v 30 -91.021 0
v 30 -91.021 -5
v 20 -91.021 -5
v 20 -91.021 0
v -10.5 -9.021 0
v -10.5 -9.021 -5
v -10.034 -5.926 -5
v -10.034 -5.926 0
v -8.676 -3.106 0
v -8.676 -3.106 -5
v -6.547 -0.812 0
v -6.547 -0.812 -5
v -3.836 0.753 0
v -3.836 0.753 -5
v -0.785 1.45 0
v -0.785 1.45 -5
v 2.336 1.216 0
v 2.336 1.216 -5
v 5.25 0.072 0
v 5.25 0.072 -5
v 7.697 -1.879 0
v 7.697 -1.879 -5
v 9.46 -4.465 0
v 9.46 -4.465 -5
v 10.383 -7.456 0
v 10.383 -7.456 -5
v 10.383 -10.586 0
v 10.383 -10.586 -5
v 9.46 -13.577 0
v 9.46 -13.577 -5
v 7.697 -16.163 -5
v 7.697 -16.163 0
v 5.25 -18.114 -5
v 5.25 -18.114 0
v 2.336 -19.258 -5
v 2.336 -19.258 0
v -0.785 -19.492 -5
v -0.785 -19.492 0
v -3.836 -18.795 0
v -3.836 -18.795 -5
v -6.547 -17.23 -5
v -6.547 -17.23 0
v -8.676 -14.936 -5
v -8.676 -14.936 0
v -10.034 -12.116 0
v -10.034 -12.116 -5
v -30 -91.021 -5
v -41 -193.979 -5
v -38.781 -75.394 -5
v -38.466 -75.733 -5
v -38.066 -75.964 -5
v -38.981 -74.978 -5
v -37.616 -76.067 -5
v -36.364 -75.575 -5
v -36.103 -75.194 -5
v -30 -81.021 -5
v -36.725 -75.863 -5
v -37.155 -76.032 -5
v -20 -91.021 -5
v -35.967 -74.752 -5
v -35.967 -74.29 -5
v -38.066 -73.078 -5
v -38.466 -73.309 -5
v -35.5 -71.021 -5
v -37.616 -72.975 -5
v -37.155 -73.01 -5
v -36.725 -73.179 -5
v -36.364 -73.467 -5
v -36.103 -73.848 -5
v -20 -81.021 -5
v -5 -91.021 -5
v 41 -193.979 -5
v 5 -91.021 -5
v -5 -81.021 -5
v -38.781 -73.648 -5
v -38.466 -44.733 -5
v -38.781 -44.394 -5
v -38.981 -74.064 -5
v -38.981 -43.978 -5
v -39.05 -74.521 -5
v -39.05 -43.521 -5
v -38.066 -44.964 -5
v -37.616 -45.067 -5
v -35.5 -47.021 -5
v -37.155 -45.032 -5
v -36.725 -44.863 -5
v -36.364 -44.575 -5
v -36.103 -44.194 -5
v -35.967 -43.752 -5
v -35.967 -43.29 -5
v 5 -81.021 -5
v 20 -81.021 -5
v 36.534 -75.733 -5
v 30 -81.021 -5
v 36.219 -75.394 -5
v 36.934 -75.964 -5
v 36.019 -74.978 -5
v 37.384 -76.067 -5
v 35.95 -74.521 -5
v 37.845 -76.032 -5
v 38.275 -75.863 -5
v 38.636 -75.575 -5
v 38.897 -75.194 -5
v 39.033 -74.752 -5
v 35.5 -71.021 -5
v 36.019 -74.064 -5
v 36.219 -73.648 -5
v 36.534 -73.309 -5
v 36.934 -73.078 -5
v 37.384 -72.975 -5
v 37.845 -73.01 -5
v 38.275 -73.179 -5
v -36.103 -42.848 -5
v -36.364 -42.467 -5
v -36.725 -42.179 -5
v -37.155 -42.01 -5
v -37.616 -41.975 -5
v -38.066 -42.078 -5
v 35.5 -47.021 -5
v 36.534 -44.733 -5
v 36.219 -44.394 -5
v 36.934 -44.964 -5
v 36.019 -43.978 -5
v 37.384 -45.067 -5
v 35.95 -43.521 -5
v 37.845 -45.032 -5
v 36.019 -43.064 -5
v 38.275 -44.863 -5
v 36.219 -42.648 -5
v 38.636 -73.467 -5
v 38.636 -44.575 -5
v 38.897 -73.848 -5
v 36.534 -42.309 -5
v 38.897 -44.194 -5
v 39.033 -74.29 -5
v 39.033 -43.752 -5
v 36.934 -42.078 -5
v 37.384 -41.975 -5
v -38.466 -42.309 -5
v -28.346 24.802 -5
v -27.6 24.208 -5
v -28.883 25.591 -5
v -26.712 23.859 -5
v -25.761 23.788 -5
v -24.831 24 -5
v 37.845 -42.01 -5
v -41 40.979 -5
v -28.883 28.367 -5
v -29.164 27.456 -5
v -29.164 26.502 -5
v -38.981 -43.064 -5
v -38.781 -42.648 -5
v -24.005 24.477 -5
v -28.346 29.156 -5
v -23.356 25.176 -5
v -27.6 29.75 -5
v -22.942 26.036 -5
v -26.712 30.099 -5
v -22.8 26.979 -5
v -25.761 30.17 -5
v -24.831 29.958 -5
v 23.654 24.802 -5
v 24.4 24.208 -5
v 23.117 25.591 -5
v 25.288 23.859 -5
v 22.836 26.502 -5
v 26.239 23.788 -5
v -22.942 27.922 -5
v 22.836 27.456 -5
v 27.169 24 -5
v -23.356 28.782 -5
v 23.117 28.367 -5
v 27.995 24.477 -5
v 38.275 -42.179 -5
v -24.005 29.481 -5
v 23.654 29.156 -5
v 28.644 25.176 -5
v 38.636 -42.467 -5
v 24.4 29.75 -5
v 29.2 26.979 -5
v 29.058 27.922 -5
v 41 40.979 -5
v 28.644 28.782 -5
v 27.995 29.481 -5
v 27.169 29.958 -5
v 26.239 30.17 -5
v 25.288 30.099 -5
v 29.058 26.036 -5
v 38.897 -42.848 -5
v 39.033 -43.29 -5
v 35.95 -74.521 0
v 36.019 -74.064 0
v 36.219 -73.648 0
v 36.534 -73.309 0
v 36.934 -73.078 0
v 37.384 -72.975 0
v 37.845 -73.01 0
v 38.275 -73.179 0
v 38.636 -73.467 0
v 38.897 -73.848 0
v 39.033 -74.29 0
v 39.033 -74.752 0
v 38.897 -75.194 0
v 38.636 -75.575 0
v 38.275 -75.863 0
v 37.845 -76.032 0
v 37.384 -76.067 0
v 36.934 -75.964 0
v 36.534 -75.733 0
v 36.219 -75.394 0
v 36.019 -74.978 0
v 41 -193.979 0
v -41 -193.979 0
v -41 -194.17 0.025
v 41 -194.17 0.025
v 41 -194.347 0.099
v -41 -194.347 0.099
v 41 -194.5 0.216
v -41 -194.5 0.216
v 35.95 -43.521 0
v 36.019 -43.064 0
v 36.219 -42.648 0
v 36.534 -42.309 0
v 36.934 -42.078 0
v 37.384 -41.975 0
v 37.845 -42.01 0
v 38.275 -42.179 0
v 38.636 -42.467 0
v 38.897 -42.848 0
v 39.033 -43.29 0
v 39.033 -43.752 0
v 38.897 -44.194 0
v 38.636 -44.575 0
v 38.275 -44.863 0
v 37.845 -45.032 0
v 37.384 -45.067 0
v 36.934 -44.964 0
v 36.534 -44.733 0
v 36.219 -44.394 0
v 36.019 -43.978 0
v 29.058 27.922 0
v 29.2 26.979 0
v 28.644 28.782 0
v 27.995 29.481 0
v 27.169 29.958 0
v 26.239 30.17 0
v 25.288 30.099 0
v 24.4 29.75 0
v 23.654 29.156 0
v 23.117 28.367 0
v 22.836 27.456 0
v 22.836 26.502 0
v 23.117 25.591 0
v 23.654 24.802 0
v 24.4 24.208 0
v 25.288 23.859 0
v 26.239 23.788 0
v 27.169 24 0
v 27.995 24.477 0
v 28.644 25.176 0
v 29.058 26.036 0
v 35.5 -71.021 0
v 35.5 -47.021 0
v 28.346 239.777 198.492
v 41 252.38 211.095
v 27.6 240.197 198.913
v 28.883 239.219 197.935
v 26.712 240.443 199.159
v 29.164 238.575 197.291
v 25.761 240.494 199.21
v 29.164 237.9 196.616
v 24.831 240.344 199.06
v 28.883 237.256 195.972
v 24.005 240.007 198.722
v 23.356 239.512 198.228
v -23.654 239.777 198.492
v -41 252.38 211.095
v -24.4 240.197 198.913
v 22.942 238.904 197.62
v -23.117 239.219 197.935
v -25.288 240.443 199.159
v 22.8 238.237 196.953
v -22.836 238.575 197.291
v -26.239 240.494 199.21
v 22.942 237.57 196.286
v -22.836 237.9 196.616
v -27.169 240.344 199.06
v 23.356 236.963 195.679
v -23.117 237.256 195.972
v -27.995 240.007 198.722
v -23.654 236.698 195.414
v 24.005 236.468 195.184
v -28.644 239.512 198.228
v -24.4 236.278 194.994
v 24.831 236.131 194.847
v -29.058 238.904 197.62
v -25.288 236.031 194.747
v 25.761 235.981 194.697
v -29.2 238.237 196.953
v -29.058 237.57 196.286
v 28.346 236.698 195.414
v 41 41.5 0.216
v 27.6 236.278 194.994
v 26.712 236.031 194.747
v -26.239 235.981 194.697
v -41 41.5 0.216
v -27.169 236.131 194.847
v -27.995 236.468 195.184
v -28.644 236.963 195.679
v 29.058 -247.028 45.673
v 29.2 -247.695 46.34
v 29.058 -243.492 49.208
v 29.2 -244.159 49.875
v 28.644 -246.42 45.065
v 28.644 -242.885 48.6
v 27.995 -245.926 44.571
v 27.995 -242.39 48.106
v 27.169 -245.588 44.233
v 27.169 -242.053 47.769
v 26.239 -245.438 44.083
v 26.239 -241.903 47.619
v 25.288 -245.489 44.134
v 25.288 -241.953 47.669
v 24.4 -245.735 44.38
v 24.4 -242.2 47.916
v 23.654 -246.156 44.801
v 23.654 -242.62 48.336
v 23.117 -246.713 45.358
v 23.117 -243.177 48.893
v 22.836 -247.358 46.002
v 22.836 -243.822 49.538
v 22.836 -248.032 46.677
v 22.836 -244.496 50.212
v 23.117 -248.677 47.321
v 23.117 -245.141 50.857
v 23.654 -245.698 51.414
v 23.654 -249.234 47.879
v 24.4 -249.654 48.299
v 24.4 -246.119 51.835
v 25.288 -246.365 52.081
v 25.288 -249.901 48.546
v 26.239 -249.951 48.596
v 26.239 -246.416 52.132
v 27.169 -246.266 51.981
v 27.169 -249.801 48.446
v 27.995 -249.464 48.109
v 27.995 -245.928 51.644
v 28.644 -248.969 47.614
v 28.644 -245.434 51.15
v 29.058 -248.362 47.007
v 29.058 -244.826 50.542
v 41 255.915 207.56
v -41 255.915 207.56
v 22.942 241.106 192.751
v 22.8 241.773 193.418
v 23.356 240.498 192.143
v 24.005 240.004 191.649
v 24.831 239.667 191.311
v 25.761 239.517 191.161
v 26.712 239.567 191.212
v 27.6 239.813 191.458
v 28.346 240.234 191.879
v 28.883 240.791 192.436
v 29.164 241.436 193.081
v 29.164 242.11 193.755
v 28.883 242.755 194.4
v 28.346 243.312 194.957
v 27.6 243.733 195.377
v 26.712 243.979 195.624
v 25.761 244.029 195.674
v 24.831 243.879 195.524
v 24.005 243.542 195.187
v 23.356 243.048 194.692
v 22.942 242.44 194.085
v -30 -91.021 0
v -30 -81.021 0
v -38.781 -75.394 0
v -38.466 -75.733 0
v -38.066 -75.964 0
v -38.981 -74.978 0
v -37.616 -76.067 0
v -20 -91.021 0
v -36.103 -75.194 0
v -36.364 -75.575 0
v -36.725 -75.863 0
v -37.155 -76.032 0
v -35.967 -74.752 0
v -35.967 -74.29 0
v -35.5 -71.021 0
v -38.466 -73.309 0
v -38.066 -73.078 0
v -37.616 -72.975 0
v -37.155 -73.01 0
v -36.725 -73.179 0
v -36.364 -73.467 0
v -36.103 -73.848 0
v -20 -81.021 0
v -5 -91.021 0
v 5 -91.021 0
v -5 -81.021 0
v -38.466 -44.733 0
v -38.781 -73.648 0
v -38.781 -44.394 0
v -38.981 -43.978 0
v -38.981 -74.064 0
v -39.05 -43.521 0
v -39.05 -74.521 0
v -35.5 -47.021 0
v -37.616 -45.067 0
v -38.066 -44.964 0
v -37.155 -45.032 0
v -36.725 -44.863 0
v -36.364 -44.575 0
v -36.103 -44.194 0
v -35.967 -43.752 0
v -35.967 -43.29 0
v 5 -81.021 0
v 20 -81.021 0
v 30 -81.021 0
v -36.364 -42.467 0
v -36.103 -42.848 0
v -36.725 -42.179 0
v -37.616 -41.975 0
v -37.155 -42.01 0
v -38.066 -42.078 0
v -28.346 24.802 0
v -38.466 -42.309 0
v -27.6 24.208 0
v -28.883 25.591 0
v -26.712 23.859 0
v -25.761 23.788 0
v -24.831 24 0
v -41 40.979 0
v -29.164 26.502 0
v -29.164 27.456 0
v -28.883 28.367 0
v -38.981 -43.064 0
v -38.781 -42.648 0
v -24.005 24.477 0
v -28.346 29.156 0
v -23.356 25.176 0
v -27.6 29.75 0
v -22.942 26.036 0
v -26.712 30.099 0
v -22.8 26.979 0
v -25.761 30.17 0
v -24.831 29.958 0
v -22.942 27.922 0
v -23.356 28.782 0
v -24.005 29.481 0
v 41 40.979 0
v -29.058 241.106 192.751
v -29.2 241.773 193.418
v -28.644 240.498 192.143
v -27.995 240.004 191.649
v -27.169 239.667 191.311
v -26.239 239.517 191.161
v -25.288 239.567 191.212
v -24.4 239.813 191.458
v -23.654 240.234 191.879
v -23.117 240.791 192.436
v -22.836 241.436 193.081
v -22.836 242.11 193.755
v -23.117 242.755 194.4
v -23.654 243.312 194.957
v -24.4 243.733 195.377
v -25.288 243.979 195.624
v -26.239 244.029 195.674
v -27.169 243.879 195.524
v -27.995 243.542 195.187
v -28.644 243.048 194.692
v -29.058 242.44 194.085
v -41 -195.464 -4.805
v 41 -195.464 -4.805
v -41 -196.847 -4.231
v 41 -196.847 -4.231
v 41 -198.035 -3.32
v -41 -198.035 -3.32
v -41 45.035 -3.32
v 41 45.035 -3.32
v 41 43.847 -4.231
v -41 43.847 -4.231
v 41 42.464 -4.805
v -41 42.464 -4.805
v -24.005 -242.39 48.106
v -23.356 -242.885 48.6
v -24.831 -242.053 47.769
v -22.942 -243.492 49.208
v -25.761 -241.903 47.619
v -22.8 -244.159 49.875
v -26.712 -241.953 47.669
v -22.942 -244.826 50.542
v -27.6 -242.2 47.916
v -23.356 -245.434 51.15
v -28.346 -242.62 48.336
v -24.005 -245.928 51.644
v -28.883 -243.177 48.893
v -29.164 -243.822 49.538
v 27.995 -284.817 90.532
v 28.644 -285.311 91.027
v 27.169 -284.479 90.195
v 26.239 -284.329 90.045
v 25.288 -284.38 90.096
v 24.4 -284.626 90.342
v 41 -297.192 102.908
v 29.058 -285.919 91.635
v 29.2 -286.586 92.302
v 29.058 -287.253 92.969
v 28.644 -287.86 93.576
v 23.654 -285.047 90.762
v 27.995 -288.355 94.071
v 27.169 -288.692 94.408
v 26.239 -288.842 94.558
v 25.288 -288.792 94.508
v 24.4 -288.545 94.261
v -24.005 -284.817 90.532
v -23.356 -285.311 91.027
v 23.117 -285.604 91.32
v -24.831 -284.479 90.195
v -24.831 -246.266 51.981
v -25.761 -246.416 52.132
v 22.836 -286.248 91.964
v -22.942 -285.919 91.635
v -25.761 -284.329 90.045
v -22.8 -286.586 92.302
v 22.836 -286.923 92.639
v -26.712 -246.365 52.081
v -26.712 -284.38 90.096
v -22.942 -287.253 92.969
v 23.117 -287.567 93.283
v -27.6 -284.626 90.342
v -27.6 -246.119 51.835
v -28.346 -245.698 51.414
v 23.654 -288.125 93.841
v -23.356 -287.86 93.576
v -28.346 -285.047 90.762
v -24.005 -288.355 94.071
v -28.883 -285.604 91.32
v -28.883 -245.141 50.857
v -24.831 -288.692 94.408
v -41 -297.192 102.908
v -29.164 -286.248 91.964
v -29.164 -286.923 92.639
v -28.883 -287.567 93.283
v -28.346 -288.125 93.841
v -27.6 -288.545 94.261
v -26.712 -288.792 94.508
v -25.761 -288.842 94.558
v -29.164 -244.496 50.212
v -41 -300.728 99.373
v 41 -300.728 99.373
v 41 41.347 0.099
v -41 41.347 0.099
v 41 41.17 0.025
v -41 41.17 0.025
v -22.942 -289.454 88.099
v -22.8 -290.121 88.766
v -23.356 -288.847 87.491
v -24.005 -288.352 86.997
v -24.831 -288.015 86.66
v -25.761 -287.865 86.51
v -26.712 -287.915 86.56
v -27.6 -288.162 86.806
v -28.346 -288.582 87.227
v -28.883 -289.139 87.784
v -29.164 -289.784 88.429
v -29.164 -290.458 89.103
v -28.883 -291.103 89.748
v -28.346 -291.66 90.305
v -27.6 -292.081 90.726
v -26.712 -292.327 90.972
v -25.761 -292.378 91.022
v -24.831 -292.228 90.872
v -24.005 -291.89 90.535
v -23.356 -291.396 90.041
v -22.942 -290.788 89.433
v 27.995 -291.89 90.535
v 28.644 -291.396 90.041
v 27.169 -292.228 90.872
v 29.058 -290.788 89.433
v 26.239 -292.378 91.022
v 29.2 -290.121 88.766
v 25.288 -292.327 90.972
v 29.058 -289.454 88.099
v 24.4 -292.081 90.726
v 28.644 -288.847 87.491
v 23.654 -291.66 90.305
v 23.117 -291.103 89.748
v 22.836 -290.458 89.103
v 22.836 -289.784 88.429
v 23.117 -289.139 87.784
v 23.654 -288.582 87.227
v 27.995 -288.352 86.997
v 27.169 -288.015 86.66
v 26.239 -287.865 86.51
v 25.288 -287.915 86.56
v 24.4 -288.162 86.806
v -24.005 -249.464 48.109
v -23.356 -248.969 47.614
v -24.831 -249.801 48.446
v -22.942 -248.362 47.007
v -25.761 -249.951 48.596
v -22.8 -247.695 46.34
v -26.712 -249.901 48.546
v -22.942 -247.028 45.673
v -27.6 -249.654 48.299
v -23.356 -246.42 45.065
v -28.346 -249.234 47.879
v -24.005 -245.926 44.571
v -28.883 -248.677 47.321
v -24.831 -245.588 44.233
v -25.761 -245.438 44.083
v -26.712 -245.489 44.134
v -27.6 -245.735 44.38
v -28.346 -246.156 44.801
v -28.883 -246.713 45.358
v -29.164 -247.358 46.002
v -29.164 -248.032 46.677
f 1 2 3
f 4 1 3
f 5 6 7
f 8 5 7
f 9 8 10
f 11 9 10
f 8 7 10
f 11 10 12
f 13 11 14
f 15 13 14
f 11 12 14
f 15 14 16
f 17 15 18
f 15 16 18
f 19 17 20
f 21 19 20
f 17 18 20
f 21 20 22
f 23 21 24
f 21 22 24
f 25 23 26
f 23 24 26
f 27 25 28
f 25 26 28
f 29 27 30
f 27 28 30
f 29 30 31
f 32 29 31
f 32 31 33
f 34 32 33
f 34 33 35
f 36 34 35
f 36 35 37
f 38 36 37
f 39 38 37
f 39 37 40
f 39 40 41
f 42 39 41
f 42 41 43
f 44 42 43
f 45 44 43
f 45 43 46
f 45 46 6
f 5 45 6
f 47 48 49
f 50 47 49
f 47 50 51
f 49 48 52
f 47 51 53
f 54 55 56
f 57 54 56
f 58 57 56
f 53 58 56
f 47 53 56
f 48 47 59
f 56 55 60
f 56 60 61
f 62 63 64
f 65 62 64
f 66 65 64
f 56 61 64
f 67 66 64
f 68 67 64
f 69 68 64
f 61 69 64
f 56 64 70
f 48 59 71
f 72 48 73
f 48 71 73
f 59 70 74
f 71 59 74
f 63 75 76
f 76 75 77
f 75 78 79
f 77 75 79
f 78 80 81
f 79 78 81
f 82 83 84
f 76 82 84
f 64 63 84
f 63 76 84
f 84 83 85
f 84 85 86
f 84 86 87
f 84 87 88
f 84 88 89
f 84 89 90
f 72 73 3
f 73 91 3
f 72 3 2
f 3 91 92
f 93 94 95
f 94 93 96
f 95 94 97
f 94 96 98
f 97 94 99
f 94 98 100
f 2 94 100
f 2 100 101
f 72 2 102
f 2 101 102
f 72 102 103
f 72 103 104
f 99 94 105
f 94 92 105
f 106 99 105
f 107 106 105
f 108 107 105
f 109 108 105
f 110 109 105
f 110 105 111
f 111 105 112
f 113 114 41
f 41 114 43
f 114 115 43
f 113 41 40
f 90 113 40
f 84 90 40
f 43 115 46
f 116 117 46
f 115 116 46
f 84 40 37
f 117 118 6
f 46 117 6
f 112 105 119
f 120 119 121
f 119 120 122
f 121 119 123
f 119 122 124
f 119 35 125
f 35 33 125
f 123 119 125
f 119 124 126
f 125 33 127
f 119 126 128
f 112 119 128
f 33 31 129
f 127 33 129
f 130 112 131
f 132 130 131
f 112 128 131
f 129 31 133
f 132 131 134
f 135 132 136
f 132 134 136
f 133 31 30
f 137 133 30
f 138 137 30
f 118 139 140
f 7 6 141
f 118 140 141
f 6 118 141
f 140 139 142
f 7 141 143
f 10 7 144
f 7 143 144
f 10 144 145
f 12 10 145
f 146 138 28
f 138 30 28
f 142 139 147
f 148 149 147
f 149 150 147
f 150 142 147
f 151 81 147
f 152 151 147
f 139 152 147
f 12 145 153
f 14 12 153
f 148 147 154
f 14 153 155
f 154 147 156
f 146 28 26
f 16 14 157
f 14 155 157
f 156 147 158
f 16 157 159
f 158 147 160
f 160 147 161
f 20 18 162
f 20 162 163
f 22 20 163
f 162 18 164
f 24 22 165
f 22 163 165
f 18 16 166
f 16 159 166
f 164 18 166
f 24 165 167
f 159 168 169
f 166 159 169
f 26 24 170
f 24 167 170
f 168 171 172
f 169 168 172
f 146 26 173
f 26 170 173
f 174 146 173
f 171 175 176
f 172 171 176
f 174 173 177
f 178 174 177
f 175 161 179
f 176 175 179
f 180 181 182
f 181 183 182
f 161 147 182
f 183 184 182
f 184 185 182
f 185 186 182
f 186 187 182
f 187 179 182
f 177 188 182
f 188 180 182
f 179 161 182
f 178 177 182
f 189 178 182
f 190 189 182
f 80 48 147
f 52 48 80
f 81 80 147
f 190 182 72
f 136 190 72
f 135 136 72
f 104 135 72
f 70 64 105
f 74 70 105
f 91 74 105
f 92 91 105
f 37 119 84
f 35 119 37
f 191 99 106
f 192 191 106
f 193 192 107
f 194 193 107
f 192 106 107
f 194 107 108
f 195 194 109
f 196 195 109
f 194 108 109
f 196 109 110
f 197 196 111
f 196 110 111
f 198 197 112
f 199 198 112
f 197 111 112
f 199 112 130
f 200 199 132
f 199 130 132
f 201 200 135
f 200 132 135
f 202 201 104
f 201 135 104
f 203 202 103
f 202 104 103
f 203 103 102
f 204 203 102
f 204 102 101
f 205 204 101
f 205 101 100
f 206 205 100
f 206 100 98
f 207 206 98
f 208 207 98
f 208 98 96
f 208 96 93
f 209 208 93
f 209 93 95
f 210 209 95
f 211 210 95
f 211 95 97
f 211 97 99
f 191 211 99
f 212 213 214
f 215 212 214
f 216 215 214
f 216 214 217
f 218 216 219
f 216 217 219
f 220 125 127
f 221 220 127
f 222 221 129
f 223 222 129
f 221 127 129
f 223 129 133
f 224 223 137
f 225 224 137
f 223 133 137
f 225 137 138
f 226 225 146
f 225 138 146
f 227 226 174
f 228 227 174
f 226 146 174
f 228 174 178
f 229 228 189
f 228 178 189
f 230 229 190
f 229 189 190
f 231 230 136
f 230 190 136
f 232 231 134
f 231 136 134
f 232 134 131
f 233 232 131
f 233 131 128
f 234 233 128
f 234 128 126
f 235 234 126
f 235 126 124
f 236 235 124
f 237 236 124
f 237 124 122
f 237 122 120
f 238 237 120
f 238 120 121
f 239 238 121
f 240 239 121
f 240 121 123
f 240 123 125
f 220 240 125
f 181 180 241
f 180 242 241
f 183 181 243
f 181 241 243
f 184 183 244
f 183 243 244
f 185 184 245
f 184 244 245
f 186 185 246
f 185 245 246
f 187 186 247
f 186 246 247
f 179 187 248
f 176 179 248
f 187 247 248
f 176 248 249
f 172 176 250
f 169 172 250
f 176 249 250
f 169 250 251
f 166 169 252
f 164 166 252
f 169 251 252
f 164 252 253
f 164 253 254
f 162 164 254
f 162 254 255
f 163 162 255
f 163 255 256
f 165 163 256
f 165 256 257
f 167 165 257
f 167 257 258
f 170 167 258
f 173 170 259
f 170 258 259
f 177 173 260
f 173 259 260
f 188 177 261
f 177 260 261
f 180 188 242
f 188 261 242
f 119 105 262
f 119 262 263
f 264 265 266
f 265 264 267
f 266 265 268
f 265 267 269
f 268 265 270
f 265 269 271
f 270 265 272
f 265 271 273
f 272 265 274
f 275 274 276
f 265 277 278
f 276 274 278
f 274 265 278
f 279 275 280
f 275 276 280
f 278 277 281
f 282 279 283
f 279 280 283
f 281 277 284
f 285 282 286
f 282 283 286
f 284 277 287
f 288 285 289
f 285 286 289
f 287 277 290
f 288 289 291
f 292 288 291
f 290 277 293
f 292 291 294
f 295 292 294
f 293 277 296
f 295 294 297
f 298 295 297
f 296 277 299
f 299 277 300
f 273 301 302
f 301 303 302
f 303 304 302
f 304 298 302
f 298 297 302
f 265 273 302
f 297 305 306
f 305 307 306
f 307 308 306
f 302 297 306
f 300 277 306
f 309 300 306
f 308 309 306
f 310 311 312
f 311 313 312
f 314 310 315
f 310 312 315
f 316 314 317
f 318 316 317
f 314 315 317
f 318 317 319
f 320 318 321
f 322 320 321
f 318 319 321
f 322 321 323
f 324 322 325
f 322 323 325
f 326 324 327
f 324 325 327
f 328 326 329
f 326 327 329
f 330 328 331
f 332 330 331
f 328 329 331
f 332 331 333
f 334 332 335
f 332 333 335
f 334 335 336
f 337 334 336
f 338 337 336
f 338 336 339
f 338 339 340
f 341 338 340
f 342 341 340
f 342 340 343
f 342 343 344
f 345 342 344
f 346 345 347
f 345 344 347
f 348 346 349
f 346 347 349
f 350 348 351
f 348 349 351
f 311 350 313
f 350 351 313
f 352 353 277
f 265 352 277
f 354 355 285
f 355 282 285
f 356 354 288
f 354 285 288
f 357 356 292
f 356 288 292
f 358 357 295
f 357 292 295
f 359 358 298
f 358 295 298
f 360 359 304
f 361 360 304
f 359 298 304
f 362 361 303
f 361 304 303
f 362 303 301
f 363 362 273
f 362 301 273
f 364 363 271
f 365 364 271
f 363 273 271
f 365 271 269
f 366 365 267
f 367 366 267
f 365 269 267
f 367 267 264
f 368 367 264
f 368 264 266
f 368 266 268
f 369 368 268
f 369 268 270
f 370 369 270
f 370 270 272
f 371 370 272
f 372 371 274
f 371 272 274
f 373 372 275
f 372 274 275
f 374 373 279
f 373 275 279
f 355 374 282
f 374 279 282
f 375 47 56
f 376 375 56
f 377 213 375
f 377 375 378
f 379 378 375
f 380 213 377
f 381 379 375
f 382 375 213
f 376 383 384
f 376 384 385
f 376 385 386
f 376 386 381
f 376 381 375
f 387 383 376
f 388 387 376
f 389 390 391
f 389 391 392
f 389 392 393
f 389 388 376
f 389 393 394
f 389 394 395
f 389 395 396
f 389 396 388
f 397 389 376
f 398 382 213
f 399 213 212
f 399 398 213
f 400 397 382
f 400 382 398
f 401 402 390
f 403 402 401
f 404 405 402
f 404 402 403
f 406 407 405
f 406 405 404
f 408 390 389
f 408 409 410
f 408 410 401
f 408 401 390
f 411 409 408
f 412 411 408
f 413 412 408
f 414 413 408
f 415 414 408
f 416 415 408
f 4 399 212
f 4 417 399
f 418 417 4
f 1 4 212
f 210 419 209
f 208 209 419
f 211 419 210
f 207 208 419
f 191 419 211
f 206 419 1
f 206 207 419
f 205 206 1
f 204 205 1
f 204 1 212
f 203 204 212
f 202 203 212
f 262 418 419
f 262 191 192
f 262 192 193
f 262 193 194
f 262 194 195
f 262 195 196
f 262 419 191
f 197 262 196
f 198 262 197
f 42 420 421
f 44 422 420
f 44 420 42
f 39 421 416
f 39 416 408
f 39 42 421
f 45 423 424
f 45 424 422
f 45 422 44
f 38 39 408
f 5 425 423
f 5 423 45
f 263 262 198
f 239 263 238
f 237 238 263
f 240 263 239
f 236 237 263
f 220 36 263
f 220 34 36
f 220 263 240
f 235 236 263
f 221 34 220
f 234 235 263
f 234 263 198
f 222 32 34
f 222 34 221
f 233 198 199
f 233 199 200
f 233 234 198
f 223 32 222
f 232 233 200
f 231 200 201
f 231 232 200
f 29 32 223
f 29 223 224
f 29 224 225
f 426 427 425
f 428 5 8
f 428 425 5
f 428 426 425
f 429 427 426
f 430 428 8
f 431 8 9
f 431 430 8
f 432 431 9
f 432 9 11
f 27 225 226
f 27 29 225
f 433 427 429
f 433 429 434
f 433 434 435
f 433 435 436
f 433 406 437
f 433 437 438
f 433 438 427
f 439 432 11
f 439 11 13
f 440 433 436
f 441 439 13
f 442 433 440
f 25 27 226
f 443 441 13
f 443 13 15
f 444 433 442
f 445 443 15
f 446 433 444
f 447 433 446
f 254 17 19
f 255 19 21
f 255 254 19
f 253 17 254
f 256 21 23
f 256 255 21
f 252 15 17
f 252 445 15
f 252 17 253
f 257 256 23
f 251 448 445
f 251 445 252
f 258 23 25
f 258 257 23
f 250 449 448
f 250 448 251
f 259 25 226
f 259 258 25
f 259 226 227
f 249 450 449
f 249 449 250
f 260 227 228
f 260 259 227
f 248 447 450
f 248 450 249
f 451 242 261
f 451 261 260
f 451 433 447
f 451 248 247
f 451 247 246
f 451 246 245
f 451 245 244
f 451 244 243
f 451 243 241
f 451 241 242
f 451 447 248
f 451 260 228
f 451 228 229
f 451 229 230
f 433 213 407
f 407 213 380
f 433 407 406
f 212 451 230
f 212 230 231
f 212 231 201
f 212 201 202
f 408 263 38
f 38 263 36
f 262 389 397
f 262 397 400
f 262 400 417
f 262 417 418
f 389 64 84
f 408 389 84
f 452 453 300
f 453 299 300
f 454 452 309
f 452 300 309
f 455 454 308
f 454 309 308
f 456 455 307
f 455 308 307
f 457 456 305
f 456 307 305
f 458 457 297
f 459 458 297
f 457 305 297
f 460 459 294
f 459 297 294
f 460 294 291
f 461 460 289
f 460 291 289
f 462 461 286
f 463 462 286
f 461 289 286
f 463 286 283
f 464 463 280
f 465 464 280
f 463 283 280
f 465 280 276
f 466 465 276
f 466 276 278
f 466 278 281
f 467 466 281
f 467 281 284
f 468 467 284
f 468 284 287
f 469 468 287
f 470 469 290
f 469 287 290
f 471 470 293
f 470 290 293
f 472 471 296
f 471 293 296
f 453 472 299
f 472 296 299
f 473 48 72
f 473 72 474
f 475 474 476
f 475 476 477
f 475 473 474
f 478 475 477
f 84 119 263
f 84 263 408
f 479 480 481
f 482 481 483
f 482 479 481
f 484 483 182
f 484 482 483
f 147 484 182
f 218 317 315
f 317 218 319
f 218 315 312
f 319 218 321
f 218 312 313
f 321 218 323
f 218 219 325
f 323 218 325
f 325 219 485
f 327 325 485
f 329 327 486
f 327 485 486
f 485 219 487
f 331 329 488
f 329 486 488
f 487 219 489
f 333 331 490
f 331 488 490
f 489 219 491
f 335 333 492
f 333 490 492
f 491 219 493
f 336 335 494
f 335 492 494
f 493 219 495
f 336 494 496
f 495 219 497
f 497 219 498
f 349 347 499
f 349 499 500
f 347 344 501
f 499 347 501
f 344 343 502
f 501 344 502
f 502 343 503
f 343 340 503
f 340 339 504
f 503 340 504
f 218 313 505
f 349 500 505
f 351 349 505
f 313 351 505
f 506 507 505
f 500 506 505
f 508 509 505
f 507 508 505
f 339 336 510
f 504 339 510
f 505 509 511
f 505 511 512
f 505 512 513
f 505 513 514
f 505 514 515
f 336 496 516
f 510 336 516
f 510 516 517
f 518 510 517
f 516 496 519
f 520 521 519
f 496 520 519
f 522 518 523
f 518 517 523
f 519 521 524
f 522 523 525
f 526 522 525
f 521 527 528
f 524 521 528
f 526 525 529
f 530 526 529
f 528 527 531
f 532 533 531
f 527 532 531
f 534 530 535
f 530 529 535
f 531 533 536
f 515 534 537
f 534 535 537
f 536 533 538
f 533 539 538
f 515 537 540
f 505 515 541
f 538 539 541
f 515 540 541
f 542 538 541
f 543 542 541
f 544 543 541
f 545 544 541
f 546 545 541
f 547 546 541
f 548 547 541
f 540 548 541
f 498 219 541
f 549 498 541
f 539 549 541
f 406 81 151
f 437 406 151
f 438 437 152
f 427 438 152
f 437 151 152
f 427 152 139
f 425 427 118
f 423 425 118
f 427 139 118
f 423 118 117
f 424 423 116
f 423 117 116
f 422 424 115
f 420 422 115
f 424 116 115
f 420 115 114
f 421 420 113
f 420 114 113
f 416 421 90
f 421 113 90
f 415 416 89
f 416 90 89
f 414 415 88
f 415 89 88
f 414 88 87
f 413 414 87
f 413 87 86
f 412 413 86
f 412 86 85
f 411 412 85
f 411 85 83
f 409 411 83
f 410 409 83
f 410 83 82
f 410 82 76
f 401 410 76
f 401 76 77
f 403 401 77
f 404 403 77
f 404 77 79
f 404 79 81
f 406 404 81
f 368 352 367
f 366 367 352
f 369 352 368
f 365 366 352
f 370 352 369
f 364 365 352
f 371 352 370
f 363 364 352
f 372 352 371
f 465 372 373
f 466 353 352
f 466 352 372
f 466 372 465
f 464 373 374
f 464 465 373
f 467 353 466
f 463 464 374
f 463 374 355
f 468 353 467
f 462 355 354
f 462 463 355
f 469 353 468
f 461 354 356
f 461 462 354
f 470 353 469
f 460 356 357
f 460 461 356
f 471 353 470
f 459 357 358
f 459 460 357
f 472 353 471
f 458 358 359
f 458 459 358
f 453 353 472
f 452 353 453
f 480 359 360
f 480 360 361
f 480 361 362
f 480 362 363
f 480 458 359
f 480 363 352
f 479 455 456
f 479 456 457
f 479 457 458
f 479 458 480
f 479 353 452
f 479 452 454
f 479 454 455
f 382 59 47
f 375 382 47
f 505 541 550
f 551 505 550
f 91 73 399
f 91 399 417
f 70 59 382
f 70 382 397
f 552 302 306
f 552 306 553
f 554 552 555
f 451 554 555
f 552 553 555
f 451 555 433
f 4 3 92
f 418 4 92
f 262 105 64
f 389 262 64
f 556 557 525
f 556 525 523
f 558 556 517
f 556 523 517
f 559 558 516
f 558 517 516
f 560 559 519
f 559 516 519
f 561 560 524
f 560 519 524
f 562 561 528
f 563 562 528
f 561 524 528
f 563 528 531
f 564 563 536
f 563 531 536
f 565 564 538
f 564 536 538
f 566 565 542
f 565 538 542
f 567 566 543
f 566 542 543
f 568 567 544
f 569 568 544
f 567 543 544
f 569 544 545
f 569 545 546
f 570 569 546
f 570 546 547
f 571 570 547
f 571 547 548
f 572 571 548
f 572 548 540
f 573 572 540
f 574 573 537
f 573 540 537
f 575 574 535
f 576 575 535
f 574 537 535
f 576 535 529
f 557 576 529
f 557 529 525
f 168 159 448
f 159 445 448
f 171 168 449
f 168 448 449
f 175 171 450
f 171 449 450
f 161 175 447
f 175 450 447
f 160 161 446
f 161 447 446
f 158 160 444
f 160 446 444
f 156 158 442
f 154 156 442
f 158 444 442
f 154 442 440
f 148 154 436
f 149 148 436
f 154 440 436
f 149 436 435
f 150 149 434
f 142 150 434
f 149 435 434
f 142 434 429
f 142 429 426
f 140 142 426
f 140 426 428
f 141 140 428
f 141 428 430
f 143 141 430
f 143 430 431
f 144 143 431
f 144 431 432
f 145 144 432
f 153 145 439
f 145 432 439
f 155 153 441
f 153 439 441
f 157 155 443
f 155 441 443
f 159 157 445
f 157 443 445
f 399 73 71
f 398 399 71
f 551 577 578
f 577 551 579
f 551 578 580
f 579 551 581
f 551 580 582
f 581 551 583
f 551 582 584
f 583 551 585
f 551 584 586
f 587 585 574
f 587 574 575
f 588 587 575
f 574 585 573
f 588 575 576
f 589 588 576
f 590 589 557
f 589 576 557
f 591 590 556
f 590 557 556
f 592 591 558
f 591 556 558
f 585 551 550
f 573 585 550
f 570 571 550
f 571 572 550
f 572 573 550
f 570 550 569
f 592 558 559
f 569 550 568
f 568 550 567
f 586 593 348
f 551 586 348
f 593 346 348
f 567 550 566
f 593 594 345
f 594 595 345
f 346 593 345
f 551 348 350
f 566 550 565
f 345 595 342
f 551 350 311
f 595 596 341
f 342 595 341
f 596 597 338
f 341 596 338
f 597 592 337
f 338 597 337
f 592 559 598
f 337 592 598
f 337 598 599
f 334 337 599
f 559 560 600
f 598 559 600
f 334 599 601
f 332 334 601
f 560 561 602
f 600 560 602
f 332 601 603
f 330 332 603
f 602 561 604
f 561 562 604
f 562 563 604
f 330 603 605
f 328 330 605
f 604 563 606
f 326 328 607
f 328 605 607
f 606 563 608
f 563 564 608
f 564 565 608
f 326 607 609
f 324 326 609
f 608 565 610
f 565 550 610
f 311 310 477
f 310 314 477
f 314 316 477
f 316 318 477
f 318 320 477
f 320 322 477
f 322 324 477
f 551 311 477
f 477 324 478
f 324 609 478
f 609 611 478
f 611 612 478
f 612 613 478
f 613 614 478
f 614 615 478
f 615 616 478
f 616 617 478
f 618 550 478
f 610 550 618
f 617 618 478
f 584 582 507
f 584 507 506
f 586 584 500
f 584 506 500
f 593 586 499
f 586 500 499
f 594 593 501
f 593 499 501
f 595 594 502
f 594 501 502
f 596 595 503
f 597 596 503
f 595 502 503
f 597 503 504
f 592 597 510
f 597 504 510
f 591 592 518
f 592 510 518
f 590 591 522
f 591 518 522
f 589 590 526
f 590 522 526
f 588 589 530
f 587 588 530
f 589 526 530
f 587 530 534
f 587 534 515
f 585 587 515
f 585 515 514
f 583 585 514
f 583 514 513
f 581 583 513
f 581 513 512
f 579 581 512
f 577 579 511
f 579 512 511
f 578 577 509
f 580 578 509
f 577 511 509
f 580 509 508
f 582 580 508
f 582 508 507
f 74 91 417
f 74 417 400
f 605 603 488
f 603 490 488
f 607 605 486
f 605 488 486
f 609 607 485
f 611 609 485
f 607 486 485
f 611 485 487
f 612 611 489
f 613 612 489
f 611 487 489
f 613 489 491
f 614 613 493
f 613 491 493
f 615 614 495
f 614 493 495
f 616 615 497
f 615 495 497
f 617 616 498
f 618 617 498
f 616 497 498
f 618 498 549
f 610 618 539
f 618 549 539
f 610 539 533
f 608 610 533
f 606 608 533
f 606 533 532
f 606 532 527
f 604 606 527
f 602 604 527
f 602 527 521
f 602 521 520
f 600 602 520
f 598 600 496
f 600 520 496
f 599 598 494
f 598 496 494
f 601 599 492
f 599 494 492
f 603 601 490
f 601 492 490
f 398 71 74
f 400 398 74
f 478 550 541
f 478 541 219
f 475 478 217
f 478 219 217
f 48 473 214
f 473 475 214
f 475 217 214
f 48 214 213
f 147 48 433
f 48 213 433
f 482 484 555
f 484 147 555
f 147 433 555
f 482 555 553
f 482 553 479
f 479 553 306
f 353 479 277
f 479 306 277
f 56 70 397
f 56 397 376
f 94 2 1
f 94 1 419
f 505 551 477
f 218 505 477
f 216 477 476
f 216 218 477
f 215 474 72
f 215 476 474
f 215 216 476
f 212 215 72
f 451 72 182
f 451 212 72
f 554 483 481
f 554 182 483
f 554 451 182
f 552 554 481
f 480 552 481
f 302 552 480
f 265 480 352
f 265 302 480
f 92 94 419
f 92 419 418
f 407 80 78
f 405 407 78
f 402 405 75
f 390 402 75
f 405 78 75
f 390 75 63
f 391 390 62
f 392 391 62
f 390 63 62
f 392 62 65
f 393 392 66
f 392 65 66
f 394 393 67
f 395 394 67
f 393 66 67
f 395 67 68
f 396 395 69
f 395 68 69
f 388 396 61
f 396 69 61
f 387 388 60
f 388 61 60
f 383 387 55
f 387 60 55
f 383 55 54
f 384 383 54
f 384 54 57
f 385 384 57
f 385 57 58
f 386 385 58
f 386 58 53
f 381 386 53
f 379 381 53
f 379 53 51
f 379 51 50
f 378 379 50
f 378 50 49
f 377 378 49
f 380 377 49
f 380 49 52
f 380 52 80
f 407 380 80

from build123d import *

# Parameters (mm, degrees)
SKETCH1_W                = 82
SKETCH1_H                = 683.5
BASE_FLANGE1_DEPTH       = 5
SKETCHED_START           = -41
SKETCHED_BEND1_DEPTH     = 82
SKETCHED_BEND1_2_DEPTH   = 82
M6_CLEARANCE_HOLE1_D     = 6.4
M6_CLEARANCE_HOLE1_DEPTH = 5
M6_CLEARANCE_HOLE1_TIP   = 1.922753981
SKETCH8_R                = 10.5
CUT_EXTRUDE1_DEPTH       = 373.579466057
SKETCH9_R                = 1.55
SKETCH9_W                = 71
SKETCH9_H                = 24
SKETCH9_W_2              = 10
SKETCH9_H_2              = 10
CUT_EXTRUDE2_DEPTH       = 373.579466057
M6_CLEARANCE_HOLE3_D     = 6.4
M6_CLEARANCE_HOLE3_DEPTH = 5
M6_CLEARANCE_HOLE3_TIP   = 1.922753981
M6_CLEARANCE_HOLE4_D     = 6.4
M6_CLEARANCE_HOLE4_DEPTH = 5
M6_CLEARANCE_HOLE4_TIP   = 1.922753981


# Read off the part's stored shape, not the designer's step: Sketched Bend1
# Sheet-metal steps are written as plain solids
with BuildPart() as part:
    # Sketch1 → Base-Flange1 (new body)
    with BuildSketch(Plane.XY):
        Rectangle(SKETCH1_W, SKETCH1_H)
    extrude(amount=-BASE_FLANGE1_DEPTH)

    # Sketched Bend1 outline → Sketched Bend1 (cut)
    with BuildSketch(Plane.YZ.offset(SKETCHED_START)):
        with BuildLine():
            Line((-341.75, -5), (-193.978990152, -5))
            ThreePointArc((-193.978990152, -5), (-196.17429193, -4.563327326), (-198.035378913, -3.319788761))
            Line((-198.035378913, -3.319788761), (-201.355167674, 0))
            Line((-201.355167674, 0), (-341.75, 0))
            Line((-341.75, 0), (-341.75, -5))
        make_face()
        with BuildLine():
            ThreePointArc((45.035378913, -3.319788761), (43.17429193, -4.563327326), (40.978990152, -5))
            Line((40.978990152, -5), (341.75, -5))
            Line((341.75, -5), (341.75, 0))
            Line((341.75, 0), (48.355167674, 0))
            Line((48.355167674, 0), (45.035378913, -3.319788761))
        make_face()
    extrude(amount=SKETCHED_BEND1_DEPTH, mode=Mode.SUBTRACT)

    # Sketched Bend1 2 outline → Sketched Bend1 2 (add)
    with BuildSketch(Plane.YZ.offset(SKETCHED_START)):
        with BuildLine():
            Line((-300.727782675, 99.372615001), (-201.355167674, 0))
            Line((-201.355167674, 0), (-193.978990152, 0))
            ThreePointArc((-193.978990152, 0), (-194.260874768, 0.056070336), (-194.499845007, 0.215745145))
            Line((-194.499845007, 0.215745145), (-297.192248769, 102.908148906))
            Line((-297.192248769, 102.908148906), (-300.727782675, 99.372615001))
        make_face()
        with BuildLine():
            Line((40.978990152, 0), (48.355167674, 0))
            Line((48.355167674, 0), (255.915120196, 207.559952522))
            Line((255.915120196, 207.559952522), (252.37958629, 211.095486428))
            Line((252.37958629, 211.095486428), (41.499845007, 0.215745145))
            ThreePointArc((41.499845007, 0.215745145), (41.260874768, 0.056070336), (40.978990152, 0))
        make_face()
    extrude(amount=SKETCHED_BEND1_2_DEPTH)

    # M6 Clearance Hole1
    with Locations(Plane(origin=(0, 0, -5), x_dir=(-1, 0, 0), z_dir=(0, 0, -1))):
        with Locations((-26, 26.978990152), (26, 26.978990152)):
            Hole(M6_CLEARANCE_HOLE1_D / 2, depth=M6_CLEARANCE_HOLE1_DEPTH)
            with Locations((0, 0, -(M6_CLEARANCE_HOLE1_DEPTH + M6_CLEARANCE_HOLE1_TIP / 2))):  # 118° drill point
                Cone(0, M6_CLEARANCE_HOLE1_D / 2, M6_CLEARANCE_HOLE1_TIP, mode=Mode.SUBTRACT)

    # Sketch8 → Cut-Extrude1 (cut, through all)
    with BuildSketch(Plane(origin=(0, 0, -5), x_dir=(-1, 0, 0), z_dir=(0, 0, -1))):
        with Locations((0, -9.021009848)):
            Circle(SKETCH8_R)
    extrude(amount=-CUT_EXTRUDE1_DEPTH, mode=Mode.SUBTRACT)

    # Sketch9 → Cut-Extrude2 (cut, through all)
    with BuildSketch(Plane(origin=(0, 0, -5), x_dir=(-1, 0, 0), z_dir=(0, 0, -1))):
        with Locations((-37.5, -43.521009848)):
            Circle(SKETCH9_R)
        with Locations((-37.5, -74.521009848)):
            Circle(SKETCH9_R)
        with Locations((37.5, -74.521009848)):
            Circle(SKETCH9_R)
        with Locations((37.5, -43.521009848)):
            Circle(SKETCH9_R)
        with Locations((0, -59.021009848)):
            Rectangle(SKETCH9_W, SKETCH9_H)
        with Locations((0, -86.021009848)):
            Rectangle(SKETCH9_W_2, SKETCH9_H_2)
        with Locations((-25, -86.021009848)):
            Rectangle(SKETCH9_W_2, SKETCH9_H_2)
        with Locations((25, -86.021009848)):
            Rectangle(SKETCH9_W_2, SKETCH9_H_2)
    extrude(amount=-CUT_EXTRUDE2_DEPTH, mode=Mode.SUBTRACT)

    # M6 Clearance Hole3
    with Locations(Plane(origin=(0, -100.677583837, -100.677583837), x_dir=(-1, 0, 0), z_dir=(0, -0.7071067811865487, -0.7071067811865465))):
        with Locations((-26, -207.913704352), (26, -207.913704352), (26, -267.913704352), (-26, -267.913704352)):
            Hole(M6_CLEARANCE_HOLE3_D / 2, depth=M6_CLEARANCE_HOLE3_DEPTH)
            with Locations((0, 0, -(M6_CLEARANCE_HOLE3_DEPTH + M6_CLEARANCE_HOLE3_TIP / 2))):  # 118° drill point
                Cone(0, M6_CLEARANCE_HOLE3_D / 2, M6_CLEARANCE_HOLE3_TIP, mode=Mode.SUBTRACT)

    # M6 Clearance Hole4
    with Locations(Plane(origin=(0, 24.177583837, -24.177583837), x_dir=(1, 0, 0), z_dir=(0, 0.7071067811865487, -0.7071067811865465))):
        with Locations((-26, -307.72636683), (26, -307.72636683)):
            Hole(M6_CLEARANCE_HOLE4_D / 2, depth=M6_CLEARANCE_HOLE4_DEPTH)
            with Locations((0, 0, -(M6_CLEARANCE_HOLE4_DEPTH + M6_CLEARANCE_HOLE4_TIP / 2))):  # 118° drill point
                Cone(0, M6_CLEARANCE_HOLE4_D / 2, M6_CLEARANCE_HOLE4_TIP, mode=Mode.SUBTRACT)


solid = part.part
